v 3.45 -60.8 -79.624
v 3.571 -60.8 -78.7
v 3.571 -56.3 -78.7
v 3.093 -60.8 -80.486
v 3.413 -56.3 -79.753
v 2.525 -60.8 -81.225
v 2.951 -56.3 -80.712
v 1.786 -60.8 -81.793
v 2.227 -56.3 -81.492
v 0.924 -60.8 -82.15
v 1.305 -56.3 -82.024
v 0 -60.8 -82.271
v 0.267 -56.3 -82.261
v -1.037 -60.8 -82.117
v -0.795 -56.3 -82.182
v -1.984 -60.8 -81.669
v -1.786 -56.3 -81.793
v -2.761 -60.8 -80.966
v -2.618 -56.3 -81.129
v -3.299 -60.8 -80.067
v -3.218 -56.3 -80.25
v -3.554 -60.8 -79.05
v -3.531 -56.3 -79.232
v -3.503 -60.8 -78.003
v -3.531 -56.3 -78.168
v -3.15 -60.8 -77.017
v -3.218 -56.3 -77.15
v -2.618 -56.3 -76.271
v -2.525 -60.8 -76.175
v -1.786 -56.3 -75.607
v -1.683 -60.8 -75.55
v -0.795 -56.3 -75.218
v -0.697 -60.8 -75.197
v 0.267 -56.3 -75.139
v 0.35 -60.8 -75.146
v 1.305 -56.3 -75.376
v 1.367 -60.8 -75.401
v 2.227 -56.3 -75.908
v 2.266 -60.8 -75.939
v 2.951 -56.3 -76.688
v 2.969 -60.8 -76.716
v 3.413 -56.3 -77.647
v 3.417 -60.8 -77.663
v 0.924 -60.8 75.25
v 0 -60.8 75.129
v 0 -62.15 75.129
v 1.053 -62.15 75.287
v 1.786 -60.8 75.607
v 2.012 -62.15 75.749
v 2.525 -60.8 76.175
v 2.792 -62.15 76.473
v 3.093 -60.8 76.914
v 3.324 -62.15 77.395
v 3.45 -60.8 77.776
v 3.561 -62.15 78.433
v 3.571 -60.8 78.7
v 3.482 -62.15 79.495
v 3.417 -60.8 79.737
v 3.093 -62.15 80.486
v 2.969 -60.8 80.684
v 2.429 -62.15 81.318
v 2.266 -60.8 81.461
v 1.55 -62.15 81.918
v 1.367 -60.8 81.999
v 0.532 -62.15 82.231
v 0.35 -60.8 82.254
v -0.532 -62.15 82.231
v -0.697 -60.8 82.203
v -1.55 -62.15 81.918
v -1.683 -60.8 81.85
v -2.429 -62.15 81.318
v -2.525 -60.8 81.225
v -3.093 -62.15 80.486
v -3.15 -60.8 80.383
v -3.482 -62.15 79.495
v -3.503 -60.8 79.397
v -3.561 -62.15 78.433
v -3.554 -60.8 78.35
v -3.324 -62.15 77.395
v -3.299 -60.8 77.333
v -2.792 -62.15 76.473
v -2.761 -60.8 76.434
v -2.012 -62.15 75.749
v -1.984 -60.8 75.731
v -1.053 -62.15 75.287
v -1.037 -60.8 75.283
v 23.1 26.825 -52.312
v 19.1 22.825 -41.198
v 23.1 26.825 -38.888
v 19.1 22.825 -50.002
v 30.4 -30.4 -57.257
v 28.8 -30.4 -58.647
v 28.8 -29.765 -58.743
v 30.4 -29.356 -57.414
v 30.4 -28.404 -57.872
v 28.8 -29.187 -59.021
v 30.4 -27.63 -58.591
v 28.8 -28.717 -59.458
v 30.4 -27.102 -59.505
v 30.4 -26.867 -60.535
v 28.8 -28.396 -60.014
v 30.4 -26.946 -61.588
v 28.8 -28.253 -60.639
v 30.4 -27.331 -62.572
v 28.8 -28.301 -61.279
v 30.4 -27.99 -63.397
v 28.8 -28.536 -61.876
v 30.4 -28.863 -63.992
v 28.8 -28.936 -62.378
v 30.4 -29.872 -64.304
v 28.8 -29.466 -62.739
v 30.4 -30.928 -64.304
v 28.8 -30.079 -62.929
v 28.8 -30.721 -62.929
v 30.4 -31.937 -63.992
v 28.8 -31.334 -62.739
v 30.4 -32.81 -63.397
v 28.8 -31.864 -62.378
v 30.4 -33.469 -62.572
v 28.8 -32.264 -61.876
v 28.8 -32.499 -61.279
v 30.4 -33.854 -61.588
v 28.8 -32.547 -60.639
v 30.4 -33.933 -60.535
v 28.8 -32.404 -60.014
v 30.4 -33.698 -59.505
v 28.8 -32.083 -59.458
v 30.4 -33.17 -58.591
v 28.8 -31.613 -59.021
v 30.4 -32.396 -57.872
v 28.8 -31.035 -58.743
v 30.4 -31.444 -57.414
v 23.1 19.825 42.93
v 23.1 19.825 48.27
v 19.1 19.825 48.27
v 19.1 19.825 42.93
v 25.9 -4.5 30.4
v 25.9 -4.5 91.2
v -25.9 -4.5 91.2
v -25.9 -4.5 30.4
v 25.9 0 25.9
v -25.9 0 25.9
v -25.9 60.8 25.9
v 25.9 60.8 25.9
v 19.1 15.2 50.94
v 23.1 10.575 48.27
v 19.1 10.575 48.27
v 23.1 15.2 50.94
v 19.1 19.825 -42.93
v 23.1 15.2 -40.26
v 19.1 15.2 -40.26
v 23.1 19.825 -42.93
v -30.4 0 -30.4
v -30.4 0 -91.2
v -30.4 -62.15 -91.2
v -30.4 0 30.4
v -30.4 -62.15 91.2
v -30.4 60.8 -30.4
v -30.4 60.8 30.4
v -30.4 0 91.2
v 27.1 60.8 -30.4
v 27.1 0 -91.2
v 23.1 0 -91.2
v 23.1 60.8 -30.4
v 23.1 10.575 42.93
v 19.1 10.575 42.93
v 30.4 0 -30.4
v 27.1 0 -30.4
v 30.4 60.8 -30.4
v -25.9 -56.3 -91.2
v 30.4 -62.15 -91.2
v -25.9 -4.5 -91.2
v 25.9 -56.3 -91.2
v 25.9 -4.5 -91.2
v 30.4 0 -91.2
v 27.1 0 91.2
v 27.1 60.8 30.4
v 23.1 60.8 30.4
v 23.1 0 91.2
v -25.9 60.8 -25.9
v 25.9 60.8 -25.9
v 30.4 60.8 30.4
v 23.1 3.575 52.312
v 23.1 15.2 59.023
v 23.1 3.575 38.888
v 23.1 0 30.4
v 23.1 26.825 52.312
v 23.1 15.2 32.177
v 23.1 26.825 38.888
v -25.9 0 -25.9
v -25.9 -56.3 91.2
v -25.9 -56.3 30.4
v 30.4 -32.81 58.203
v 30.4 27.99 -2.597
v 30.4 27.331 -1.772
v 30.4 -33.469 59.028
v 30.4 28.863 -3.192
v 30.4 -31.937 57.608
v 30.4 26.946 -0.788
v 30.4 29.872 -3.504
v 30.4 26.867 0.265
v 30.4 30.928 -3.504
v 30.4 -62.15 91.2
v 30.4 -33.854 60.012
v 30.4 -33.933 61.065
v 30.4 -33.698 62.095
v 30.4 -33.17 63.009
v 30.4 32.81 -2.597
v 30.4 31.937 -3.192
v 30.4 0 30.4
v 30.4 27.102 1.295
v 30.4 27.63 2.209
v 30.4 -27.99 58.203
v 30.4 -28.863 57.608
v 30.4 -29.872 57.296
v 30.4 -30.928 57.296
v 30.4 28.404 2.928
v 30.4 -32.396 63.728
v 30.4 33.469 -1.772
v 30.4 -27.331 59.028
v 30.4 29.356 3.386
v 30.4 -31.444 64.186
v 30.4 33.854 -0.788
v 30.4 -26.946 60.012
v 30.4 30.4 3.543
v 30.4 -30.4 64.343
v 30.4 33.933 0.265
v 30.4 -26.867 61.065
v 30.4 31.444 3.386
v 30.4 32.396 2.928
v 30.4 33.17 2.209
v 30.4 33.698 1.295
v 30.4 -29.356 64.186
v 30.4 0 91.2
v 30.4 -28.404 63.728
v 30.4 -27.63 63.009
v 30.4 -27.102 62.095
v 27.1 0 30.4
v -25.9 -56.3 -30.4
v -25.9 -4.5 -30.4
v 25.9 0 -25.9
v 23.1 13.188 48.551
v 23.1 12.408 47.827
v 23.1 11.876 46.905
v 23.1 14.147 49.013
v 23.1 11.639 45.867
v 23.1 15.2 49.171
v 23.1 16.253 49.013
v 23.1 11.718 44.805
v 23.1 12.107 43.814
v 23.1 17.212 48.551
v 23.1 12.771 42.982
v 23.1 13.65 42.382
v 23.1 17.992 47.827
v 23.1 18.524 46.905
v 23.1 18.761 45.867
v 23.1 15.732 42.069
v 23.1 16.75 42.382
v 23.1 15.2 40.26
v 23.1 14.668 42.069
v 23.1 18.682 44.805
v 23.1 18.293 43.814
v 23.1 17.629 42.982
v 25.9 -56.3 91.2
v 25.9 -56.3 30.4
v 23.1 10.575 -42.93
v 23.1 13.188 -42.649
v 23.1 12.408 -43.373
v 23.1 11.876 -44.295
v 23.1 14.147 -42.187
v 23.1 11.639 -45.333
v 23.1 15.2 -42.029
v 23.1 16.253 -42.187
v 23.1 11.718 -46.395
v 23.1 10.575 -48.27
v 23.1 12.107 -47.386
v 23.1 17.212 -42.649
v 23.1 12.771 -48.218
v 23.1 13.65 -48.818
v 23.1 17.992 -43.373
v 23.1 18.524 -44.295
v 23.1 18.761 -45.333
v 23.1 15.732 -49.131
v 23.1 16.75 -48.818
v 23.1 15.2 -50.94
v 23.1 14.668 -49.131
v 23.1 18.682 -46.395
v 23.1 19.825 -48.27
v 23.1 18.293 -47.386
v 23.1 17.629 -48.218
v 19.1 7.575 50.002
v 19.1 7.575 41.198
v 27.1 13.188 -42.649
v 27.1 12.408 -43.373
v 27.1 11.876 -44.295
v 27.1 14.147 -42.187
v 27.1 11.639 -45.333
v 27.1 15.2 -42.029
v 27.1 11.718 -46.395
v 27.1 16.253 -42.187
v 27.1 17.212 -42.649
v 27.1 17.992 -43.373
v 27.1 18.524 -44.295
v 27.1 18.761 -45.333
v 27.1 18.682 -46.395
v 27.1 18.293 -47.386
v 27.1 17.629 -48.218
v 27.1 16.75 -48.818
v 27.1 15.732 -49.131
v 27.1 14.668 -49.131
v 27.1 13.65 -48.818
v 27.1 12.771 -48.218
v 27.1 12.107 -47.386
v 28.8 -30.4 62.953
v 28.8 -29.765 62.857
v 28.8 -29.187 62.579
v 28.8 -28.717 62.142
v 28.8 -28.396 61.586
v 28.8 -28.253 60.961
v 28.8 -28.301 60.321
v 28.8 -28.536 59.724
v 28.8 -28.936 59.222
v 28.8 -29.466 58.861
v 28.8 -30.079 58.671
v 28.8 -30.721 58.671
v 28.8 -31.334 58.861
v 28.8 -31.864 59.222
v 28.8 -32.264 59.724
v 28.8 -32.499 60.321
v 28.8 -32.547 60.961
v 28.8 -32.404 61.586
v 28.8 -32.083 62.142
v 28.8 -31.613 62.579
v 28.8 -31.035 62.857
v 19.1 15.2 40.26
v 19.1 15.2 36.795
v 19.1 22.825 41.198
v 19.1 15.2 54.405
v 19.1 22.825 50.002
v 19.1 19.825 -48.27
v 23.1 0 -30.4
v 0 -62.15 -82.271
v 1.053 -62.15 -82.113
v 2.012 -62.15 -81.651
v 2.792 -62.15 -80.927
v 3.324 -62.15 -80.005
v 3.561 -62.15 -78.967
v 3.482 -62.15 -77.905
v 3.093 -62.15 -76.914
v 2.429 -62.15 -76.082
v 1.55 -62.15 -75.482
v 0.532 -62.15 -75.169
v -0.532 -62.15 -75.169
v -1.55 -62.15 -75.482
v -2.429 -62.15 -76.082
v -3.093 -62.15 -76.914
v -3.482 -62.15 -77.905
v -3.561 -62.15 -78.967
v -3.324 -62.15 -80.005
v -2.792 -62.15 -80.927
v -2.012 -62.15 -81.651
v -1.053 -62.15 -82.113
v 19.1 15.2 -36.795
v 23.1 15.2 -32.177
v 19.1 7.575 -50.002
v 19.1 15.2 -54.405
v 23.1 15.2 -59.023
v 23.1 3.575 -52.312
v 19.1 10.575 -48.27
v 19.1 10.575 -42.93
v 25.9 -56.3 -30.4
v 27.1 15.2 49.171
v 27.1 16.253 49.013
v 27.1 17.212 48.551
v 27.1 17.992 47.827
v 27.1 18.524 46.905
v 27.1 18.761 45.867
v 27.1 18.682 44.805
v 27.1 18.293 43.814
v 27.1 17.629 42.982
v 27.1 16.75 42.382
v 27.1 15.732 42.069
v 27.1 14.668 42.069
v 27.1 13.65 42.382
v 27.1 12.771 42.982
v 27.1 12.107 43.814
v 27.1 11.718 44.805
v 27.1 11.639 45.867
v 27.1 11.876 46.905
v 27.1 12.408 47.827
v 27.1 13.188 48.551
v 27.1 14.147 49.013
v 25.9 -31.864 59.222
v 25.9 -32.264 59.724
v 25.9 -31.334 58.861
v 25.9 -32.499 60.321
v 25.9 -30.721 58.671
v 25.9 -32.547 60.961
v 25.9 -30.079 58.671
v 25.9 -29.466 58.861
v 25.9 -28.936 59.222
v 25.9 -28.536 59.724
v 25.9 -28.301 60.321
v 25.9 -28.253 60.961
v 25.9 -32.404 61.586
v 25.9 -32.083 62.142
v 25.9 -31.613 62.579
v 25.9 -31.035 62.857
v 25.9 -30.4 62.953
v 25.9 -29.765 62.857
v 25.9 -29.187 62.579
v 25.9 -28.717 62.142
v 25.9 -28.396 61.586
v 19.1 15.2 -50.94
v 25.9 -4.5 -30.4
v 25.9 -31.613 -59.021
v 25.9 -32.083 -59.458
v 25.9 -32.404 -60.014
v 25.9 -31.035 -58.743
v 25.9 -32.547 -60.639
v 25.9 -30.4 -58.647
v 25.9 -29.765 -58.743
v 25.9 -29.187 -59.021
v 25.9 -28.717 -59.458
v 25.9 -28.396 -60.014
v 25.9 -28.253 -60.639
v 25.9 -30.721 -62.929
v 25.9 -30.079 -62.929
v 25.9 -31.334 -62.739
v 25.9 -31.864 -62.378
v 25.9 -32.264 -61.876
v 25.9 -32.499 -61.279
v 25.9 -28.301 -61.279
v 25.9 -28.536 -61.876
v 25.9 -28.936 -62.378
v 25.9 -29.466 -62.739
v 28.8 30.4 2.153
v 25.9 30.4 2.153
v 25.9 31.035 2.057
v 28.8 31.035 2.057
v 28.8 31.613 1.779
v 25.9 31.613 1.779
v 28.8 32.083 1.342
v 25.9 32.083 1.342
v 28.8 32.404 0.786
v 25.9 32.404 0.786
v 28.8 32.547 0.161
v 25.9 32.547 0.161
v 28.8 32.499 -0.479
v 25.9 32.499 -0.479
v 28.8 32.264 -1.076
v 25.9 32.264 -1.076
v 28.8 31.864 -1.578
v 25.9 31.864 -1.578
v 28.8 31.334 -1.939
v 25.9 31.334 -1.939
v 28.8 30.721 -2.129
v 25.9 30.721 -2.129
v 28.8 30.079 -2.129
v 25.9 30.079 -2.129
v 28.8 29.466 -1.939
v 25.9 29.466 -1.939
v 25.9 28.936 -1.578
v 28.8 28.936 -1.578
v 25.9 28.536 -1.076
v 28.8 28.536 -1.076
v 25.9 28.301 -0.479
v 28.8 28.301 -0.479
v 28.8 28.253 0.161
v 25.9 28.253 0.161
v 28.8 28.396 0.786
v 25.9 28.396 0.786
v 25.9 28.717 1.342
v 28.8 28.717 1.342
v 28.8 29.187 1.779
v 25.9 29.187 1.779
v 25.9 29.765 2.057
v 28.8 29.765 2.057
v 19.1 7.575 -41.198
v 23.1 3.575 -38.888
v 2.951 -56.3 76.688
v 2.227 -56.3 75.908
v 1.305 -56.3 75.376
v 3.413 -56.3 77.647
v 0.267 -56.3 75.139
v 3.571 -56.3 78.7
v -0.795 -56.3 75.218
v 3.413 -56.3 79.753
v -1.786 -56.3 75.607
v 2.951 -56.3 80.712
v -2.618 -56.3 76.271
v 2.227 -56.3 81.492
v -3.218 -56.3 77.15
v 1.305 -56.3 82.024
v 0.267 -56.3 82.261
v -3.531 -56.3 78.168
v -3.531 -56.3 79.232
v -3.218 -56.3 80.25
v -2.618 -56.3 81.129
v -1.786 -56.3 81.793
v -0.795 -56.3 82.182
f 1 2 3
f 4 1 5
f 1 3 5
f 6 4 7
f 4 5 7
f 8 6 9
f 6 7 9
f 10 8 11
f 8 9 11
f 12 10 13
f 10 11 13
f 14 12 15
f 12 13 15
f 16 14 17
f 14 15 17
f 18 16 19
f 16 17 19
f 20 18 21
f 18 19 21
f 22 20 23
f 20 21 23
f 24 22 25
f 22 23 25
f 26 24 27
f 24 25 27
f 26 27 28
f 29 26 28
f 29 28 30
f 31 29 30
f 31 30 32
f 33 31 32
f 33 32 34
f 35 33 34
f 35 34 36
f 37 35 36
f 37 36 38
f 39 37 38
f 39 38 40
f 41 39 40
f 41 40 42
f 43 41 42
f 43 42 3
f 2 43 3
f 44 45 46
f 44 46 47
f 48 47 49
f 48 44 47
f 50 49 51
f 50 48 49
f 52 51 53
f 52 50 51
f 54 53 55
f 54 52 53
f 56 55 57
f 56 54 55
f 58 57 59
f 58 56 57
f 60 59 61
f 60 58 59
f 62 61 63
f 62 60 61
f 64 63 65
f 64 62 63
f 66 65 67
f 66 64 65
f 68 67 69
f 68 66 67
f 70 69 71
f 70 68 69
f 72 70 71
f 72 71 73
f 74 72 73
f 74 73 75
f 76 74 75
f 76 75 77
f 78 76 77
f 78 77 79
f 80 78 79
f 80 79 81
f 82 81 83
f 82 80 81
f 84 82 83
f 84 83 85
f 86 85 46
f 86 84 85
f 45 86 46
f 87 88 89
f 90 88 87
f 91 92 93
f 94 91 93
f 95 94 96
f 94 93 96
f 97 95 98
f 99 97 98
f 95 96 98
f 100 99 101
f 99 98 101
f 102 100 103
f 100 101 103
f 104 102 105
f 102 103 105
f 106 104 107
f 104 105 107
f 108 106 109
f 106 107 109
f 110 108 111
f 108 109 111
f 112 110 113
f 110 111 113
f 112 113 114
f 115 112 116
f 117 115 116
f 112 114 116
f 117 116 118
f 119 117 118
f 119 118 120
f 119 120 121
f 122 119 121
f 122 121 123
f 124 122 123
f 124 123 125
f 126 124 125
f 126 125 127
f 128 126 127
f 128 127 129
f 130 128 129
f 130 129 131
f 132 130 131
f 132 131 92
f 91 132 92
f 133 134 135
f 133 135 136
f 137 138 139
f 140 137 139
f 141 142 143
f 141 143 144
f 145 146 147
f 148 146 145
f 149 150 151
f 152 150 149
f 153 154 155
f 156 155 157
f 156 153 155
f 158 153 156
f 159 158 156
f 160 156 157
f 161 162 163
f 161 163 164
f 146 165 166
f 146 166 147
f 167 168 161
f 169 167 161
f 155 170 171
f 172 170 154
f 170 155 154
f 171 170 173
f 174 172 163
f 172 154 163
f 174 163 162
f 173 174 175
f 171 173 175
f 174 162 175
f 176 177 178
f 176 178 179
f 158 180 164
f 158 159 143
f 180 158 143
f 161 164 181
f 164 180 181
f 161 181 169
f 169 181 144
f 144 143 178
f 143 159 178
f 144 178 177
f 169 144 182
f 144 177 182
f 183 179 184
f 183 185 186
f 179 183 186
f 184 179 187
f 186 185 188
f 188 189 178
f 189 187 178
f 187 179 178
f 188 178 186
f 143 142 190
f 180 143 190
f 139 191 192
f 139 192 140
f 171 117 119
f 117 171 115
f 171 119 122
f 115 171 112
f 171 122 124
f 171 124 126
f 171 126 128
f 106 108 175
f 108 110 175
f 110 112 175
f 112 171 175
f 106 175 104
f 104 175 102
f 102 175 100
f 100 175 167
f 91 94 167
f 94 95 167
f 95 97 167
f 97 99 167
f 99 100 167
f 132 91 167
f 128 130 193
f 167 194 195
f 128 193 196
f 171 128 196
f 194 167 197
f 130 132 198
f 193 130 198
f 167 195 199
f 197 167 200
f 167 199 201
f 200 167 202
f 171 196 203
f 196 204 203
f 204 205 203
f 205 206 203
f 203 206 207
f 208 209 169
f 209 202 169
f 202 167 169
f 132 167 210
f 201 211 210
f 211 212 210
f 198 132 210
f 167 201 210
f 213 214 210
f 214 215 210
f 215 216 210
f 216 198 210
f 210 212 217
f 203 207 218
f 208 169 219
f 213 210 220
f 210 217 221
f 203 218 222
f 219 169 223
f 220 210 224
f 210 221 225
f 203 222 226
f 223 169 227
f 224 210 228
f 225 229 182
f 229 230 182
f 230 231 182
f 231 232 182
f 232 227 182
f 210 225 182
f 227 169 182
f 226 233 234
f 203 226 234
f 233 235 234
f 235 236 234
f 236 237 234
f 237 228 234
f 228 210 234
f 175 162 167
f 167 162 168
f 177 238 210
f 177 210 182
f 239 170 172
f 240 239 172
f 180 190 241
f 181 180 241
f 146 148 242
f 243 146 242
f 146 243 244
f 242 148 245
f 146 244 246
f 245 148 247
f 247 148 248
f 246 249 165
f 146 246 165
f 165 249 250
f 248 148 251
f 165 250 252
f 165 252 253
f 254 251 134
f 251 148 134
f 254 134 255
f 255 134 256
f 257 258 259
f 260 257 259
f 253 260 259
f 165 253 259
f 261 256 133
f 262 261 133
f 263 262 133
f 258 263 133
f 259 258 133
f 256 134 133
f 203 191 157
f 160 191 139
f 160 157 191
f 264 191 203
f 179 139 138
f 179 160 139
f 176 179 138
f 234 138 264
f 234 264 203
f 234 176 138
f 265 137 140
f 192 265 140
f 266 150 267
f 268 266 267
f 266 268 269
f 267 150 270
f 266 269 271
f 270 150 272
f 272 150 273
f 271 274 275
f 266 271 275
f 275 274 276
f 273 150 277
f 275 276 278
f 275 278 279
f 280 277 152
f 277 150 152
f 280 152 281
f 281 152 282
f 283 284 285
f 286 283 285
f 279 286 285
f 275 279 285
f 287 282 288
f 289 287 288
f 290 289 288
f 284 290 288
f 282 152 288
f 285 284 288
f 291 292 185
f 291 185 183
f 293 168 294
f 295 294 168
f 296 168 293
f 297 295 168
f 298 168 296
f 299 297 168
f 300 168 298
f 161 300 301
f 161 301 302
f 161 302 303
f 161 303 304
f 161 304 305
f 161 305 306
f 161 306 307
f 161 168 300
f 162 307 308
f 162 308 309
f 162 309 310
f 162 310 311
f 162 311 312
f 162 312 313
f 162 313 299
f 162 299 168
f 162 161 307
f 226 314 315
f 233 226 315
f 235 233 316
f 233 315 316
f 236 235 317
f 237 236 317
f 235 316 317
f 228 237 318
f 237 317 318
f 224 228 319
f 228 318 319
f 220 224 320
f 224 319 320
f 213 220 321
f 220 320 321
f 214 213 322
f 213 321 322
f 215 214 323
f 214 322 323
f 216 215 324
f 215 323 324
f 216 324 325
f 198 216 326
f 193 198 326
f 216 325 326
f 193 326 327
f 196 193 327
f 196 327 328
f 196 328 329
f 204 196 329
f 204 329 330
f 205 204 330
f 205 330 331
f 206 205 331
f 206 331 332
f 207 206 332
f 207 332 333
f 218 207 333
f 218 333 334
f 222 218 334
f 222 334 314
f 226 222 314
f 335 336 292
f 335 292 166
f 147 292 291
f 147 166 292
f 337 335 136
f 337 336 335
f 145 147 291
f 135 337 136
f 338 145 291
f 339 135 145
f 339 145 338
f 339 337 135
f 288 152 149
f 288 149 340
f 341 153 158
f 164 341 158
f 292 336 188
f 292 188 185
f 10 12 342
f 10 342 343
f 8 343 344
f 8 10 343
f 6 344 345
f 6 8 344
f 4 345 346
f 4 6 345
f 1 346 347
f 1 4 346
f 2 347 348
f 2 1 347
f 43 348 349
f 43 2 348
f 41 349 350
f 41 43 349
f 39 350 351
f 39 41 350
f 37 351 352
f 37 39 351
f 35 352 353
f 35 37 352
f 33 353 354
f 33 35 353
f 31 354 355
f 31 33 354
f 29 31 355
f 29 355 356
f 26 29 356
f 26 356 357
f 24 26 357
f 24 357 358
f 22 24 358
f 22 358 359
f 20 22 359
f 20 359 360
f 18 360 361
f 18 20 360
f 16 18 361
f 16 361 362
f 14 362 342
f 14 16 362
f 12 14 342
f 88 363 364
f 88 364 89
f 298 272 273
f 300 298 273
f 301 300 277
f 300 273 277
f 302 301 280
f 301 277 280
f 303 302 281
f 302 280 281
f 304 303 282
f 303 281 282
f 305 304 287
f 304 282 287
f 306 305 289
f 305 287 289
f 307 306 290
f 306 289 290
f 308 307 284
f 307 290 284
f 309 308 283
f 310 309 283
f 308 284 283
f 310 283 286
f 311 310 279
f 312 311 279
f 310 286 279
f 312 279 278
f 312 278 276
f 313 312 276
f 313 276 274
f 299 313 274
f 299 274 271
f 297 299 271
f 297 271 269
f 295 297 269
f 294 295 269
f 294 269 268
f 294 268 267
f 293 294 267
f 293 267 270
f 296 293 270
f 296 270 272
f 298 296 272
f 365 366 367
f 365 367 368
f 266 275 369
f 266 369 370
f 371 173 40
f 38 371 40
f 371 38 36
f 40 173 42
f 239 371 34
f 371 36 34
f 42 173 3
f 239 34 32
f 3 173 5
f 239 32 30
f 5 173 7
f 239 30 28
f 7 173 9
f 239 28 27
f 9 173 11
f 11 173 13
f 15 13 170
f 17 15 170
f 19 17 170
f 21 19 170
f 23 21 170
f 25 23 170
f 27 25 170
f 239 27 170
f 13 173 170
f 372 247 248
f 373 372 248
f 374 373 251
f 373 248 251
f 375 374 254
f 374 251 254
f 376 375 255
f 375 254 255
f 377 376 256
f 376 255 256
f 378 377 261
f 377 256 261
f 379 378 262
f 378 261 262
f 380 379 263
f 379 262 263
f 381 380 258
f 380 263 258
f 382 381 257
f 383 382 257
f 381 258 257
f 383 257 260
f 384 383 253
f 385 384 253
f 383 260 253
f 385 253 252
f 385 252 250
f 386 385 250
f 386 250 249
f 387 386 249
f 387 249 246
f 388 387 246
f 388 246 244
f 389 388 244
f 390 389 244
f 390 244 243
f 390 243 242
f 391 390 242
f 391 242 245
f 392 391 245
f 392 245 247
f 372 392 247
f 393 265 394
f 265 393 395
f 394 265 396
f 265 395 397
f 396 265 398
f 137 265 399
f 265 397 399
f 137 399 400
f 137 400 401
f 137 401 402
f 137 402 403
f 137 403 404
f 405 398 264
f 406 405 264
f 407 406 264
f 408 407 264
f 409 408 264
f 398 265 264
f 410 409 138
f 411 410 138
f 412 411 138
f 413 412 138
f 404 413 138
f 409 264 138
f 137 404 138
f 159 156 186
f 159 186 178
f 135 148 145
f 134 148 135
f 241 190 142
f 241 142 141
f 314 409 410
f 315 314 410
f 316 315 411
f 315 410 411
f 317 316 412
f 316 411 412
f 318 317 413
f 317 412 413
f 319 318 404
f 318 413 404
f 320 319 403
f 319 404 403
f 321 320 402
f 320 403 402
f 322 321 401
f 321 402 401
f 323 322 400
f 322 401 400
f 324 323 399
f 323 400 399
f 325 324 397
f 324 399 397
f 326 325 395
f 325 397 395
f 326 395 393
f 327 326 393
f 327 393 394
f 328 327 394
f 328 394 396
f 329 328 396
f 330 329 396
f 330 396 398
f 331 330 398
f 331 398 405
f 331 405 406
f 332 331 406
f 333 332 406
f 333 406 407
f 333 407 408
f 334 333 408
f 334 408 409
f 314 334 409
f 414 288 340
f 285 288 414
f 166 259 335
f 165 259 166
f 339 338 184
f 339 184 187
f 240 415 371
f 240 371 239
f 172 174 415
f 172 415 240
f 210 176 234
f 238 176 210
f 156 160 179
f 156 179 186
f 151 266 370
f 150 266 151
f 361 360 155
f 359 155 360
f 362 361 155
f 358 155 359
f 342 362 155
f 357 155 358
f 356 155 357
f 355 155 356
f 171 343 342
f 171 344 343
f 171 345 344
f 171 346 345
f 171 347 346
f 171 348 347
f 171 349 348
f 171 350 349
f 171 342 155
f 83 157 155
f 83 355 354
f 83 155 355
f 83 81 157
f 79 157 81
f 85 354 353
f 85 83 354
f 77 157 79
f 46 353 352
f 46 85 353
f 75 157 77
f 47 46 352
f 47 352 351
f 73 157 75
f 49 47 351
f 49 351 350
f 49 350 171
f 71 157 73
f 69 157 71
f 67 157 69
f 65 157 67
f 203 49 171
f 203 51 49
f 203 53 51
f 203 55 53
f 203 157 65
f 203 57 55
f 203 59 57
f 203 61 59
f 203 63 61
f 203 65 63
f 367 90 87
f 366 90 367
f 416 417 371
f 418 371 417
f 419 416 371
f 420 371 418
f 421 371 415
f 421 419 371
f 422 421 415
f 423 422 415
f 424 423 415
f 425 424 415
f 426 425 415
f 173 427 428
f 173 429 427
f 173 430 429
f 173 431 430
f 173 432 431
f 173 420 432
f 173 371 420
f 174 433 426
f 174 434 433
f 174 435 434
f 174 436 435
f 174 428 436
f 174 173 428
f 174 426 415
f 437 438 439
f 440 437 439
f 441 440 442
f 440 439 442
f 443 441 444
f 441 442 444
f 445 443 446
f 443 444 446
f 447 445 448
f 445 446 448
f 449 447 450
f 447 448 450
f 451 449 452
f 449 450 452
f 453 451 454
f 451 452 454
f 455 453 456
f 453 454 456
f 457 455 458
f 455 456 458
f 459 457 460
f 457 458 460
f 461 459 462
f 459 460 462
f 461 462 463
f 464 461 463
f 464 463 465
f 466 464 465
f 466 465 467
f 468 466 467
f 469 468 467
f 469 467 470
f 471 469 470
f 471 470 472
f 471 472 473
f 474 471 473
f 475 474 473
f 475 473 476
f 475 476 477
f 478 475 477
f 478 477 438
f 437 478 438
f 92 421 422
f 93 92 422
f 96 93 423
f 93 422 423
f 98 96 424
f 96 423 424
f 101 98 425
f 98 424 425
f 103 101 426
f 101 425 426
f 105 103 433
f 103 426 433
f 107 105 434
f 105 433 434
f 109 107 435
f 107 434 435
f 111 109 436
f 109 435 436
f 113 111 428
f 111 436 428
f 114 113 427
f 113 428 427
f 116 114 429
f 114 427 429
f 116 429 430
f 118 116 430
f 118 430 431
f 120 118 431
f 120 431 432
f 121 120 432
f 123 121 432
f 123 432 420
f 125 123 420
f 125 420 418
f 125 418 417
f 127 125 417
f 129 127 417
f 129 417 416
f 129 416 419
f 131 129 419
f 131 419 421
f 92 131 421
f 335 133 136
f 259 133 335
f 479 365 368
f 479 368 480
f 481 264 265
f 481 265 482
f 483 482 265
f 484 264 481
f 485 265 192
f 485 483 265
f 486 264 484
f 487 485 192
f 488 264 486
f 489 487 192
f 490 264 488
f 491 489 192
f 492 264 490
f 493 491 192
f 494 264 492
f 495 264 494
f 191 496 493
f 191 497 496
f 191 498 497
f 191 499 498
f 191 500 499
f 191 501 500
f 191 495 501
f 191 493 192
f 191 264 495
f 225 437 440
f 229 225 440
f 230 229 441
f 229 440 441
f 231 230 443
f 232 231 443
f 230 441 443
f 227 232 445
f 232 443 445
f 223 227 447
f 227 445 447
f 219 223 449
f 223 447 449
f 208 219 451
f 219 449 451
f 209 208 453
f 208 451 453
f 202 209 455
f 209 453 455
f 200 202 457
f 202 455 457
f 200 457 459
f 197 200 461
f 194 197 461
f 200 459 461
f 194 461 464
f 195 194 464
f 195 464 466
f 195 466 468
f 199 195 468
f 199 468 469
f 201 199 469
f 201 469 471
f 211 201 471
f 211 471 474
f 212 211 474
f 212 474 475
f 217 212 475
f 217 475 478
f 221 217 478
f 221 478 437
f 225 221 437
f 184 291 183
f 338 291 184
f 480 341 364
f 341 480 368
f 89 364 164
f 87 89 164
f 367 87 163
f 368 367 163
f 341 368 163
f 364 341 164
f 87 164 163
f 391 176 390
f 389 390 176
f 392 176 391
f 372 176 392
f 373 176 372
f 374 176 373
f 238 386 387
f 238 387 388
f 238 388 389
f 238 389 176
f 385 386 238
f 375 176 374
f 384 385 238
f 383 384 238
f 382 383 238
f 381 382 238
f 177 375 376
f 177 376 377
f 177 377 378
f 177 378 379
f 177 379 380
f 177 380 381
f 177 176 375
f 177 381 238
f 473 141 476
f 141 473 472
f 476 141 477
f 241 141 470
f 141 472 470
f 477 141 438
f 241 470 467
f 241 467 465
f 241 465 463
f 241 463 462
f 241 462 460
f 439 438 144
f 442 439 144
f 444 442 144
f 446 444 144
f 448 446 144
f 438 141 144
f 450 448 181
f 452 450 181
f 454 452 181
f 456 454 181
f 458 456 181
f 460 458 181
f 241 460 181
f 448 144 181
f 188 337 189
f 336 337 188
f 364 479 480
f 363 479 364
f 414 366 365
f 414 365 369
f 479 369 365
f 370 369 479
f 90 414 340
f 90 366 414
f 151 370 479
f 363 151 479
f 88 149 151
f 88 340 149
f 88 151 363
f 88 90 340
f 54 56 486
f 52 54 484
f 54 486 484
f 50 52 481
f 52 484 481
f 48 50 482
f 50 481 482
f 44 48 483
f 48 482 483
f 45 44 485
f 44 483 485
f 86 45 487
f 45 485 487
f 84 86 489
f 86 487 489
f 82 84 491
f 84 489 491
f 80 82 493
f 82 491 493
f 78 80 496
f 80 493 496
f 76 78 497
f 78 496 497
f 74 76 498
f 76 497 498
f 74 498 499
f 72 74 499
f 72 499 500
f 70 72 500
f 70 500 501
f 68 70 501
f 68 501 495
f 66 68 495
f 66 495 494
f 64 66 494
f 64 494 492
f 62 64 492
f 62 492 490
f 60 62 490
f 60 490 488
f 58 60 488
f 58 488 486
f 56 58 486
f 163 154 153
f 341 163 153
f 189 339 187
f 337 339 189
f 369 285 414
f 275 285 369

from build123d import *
from build123d.topology import SkipClean

# Parameters (mm, degrees)
ESQUISSE1_W                                       = 60.8
ESQUISSE1_H                                       = 121.6
BOSS_EXTRU_1_DEPTH                                = 91.2
ESQUISSE2_W                                       = 60.8
ESQUISSE2_H                                       = 60.8
ENL_V_MAT_EXTRU_1_DEPTH                           = 126.342411019
ESQUISSE3_W                                       = 51.8
ESQUISSE3_H                                       = 51.8
ENL_V_MAT_EXTRU_2_DEPTH                           = 60.8
BOSS_EXTRU_3_DEPTH                                = 4
ESQUISSE6_W                                       = 51.8
ESQUISSE6_H                                       = 51.8
ENL_V_MAT_EXTRU_3_DEPTH                           = 60.8
D_GAGEMENT_1_43_D                                 = 7.14248
FRAISAGE_POUR_VIS_T_TE_FRAIS_E_BOMB_E_D           = 4.3053
FRAISAGE_POUR_VIS_T_TE_FRAIS_E_BOMB_E_DEPTH       = 4.5
FRAISAGE_POUR_VIS_T_TE_FRAIS_E_BOMB_E_CSINK_D     = 7.0866
FRAISAGE_POUR_VIS_T_TE_FRAIS_E_BOMB_E_CSINK_ANGLE = 82
D_GAGEMENT_1_42_D                                 = 7.14248
D_GAGEMENT_1_42_DEPTH                             = 20
BOSS_EXTRU_5_DEPTH                                = 4
CHANFREIN1_SIZE                                   = 4
ESQUISSE26_W                                      = 60.8
ESQUISSE26_H                                      = 182.4
ESQUISSE26_R                                      = 3.57124
BOSS_EXTRU_7_DEPTH                                = 1.35


with BuildPart() as part:
    # Esquisse1 → Boss.-Extru.1 (new, symmetric)
    with BuildSketch(Plane.XY):
        Rectangle(ESQUISSE1_W, ESQUISSE1_H)
    extrude(amount=BOSS_EXTRU_1_DEPTH, both=True)

    # Esquisse2 → Enlèv. mat.-Extru.1 (cut, through all)
    with BuildSketch(Plane.ZY.offset(30.4)):
        with Locations((-60.8, 30.4)):
            Rectangle(ESQUISSE2_W, ESQUISSE2_H)
    enl_v_mat_extru_1 = extrude(amount=-ENL_V_MAT_EXTRU_1_DEPTH, mode=Mode.SUBTRACT)

    # Esquisse3 → Enlèv. mat.-Extru.2 (cut)
    with BuildSketch(Plane(origin=(0, 0, -91.2), x_dir=(-1, 0, 0), z_dir=(0, 0, -1))):
        with Locations((0, -30.4)):
            Rectangle(ESQUISSE3_W, ESQUISSE3_H)
    enl_v_mat_extru_2 = extrude(amount=-ENL_V_MAT_EXTRU_2_DEPTH, mode=Mode.SUBTRACT)

    # Symétrie2: Enlèv. mat.-Extru.1, Enlèv. mat.-Extru.2 across plane
    add(enl_v_mat_extru_1.mirror(Plane.XY), mode=Mode.SUBTRACT)
    add(enl_v_mat_extru_2.mirror(Plane.XY), mode=Mode.SUBTRACT)

    # Esquisse10 → Boss.-Extru.3 (add)
    with BuildSketch(Plane(origin=(27.1, 0, 0), x_dir=(0, 0, -1), z_dir=(1, 0, 0))):
        Polygon((30.4, 60.8), (30.4, 0), (91.2, 0), align=None)
        Polygon((-30.4, 60.8), (-91.2, 0), (-30.4, 0), align=None)
    extrude(amount=-BOSS_EXTRU_3_DEPTH)

    # Esquisse6 → Enlèv. mat.-Extru.3 (cut)
    with BuildSketch(Plane(origin=(0, 60.8, 0), x_dir=(1, 0, 0), z_dir=(0, 1, 0))):
        Rectangle(ESQUISSE6_W, ESQUISSE6_H)
    extrude(amount=-ENL_V_MAT_EXTRU_3_DEPTH, mode=Mode.SUBTRACT)

    # Dégagement 1/43 (through all)
    with Locations(Plane(origin=(27.1, 0, 0), x_dir=(0, 0, -1), z_dir=(1, 0, 0))):
        with Locations((45.6, 15.2), (-45.6, 15.2)):
            Hole(D_GAGEMENT_1_43_D / 2)

    # Fraisage pour vis _ t_te frais_e bomb_e
    with Locations(Plane(origin=(30.4, 0, 0), x_dir=(0, 0, -1), z_dir=(1, 0, 0))):
        with Locations((-60.8, -30.4), (0, 30.4), (60.8, -30.4)):
            CounterSinkHole(FRAISAGE_POUR_VIS_T_TE_FRAIS_E_BOMB_E_D / 2, FRAISAGE_POUR_VIS_T_TE_FRAIS_E_BOMB_E_CSINK_D / 2, depth=FRAISAGE_POUR_VIS_T_TE_FRAIS_E_BOMB_E_DEPTH, counter_sink_angle=FRAISAGE_POUR_VIS_T_TE_FRAIS_E_BOMB_E_CSINK_ANGLE)

    # Dégagement 1/42
    with Locations(Plane(origin=(0, -60.8, 0), x_dir=(-1, 0, 0), z_dir=(0, -1, 0))):
        with Locations((0, 78.7), (0, -78.7)):
            Hole(D_GAGEMENT_1_42_D / 2, depth=D_GAGEMENT_1_42_DEPTH)

    # Esquisse23 → Boss.-Extru.5 (add)
    # profile 1 of 2: a face of its own
    with BuildSketch(Plane.ZY.offset(-23.1)):
        Polygon((-41.197704197, 22.825), (-50.002295803, 22.825), (-54.404591605, 15.2), (-50.002295803, 7.575), (-41.197704197, 7.575), (-36.795408395, 15.2), align=None)
        Polygon((-40.25951001, 15.2), (-42.929755005, 19.825), (-48.270244995, 19.825), (-50.94048999, 15.2), (-48.270244995, 10.575), (-42.929755005, 10.575), align=None, mode=Mode.SUBTRACT)
    # profile 2 of 2: a face of its own
    with BuildSketch(Plane.ZY.offset(-23.1)):
        Polygon((54.404591605, 15.2), (50.002295803, 22.825), (41.197704197, 22.825), (36.795408395, 15.2), (41.197704197, 7.575), (50.002295803, 7.575), align=None)
        Polygon((50.94048999, 15.2), (48.270244995, 19.825), (42.929755005, 19.825), (40.25951001, 15.2), (42.929755005, 10.575), (48.270244995, 10.575), align=None, mode=Mode.SUBTRACT)
    extrude(amount=BOSS_EXTRU_5_DEPTH)

    # Chanfrein1
    chanfrein1_edges = [part.edges().sort_by_distance(p)[0] for p in [
        (23.1, 19.0125, 38.996556296),
        (23.1, 11.3875, 38.996556296),
        (23.1, 7.575, 45.6),
        (23.1, 11.3875, 52.203443704),
        (23.1, 19.0125, 52.203443704),
        (23.1, 22.825, 45.6),
        (23.1, 11.3875, -38.996556296),
        (23.1, 19.0125, -38.996556296),
        (23.1, 7.575, -45.6),
        (23.1, 11.3875, -52.203443704),
        (23.1, 22.825, -45.6),
        (23.1, 19.0125, -52.203443704),
    ]]
    chamfer(chanfrein1_edges, length=CHANFREIN1_SIZE - 0.0001)  # a hair under: the kernel refuses the full size

    # Esquisse26 → Boss.-Extru.7 (add)
    with SkipClean():  # the faces are left unmerged after this step: merging them gives an invalid solid
        with BuildSketch(Plane.XZ.offset(60.8)):
            Rectangle(ESQUISSE26_W, ESQUISSE26_H)
            with Locations(Location((0, 78.7, 0), (0, 0, 270))):
                Circle(ESQUISSE26_R, mode=Mode.SUBTRACT)
            with Locations(Location((0, -78.7, 0), (0, 0, 270))):
                Circle(ESQUISSE26_R, mode=Mode.SUBTRACT)
        extrude(amount=BOSS_EXTRU_7_DEPTH)
    add(part.part.scale(1), mode=Mode.REPLACE)  # the faces are merged on a copy


solid = part.part
